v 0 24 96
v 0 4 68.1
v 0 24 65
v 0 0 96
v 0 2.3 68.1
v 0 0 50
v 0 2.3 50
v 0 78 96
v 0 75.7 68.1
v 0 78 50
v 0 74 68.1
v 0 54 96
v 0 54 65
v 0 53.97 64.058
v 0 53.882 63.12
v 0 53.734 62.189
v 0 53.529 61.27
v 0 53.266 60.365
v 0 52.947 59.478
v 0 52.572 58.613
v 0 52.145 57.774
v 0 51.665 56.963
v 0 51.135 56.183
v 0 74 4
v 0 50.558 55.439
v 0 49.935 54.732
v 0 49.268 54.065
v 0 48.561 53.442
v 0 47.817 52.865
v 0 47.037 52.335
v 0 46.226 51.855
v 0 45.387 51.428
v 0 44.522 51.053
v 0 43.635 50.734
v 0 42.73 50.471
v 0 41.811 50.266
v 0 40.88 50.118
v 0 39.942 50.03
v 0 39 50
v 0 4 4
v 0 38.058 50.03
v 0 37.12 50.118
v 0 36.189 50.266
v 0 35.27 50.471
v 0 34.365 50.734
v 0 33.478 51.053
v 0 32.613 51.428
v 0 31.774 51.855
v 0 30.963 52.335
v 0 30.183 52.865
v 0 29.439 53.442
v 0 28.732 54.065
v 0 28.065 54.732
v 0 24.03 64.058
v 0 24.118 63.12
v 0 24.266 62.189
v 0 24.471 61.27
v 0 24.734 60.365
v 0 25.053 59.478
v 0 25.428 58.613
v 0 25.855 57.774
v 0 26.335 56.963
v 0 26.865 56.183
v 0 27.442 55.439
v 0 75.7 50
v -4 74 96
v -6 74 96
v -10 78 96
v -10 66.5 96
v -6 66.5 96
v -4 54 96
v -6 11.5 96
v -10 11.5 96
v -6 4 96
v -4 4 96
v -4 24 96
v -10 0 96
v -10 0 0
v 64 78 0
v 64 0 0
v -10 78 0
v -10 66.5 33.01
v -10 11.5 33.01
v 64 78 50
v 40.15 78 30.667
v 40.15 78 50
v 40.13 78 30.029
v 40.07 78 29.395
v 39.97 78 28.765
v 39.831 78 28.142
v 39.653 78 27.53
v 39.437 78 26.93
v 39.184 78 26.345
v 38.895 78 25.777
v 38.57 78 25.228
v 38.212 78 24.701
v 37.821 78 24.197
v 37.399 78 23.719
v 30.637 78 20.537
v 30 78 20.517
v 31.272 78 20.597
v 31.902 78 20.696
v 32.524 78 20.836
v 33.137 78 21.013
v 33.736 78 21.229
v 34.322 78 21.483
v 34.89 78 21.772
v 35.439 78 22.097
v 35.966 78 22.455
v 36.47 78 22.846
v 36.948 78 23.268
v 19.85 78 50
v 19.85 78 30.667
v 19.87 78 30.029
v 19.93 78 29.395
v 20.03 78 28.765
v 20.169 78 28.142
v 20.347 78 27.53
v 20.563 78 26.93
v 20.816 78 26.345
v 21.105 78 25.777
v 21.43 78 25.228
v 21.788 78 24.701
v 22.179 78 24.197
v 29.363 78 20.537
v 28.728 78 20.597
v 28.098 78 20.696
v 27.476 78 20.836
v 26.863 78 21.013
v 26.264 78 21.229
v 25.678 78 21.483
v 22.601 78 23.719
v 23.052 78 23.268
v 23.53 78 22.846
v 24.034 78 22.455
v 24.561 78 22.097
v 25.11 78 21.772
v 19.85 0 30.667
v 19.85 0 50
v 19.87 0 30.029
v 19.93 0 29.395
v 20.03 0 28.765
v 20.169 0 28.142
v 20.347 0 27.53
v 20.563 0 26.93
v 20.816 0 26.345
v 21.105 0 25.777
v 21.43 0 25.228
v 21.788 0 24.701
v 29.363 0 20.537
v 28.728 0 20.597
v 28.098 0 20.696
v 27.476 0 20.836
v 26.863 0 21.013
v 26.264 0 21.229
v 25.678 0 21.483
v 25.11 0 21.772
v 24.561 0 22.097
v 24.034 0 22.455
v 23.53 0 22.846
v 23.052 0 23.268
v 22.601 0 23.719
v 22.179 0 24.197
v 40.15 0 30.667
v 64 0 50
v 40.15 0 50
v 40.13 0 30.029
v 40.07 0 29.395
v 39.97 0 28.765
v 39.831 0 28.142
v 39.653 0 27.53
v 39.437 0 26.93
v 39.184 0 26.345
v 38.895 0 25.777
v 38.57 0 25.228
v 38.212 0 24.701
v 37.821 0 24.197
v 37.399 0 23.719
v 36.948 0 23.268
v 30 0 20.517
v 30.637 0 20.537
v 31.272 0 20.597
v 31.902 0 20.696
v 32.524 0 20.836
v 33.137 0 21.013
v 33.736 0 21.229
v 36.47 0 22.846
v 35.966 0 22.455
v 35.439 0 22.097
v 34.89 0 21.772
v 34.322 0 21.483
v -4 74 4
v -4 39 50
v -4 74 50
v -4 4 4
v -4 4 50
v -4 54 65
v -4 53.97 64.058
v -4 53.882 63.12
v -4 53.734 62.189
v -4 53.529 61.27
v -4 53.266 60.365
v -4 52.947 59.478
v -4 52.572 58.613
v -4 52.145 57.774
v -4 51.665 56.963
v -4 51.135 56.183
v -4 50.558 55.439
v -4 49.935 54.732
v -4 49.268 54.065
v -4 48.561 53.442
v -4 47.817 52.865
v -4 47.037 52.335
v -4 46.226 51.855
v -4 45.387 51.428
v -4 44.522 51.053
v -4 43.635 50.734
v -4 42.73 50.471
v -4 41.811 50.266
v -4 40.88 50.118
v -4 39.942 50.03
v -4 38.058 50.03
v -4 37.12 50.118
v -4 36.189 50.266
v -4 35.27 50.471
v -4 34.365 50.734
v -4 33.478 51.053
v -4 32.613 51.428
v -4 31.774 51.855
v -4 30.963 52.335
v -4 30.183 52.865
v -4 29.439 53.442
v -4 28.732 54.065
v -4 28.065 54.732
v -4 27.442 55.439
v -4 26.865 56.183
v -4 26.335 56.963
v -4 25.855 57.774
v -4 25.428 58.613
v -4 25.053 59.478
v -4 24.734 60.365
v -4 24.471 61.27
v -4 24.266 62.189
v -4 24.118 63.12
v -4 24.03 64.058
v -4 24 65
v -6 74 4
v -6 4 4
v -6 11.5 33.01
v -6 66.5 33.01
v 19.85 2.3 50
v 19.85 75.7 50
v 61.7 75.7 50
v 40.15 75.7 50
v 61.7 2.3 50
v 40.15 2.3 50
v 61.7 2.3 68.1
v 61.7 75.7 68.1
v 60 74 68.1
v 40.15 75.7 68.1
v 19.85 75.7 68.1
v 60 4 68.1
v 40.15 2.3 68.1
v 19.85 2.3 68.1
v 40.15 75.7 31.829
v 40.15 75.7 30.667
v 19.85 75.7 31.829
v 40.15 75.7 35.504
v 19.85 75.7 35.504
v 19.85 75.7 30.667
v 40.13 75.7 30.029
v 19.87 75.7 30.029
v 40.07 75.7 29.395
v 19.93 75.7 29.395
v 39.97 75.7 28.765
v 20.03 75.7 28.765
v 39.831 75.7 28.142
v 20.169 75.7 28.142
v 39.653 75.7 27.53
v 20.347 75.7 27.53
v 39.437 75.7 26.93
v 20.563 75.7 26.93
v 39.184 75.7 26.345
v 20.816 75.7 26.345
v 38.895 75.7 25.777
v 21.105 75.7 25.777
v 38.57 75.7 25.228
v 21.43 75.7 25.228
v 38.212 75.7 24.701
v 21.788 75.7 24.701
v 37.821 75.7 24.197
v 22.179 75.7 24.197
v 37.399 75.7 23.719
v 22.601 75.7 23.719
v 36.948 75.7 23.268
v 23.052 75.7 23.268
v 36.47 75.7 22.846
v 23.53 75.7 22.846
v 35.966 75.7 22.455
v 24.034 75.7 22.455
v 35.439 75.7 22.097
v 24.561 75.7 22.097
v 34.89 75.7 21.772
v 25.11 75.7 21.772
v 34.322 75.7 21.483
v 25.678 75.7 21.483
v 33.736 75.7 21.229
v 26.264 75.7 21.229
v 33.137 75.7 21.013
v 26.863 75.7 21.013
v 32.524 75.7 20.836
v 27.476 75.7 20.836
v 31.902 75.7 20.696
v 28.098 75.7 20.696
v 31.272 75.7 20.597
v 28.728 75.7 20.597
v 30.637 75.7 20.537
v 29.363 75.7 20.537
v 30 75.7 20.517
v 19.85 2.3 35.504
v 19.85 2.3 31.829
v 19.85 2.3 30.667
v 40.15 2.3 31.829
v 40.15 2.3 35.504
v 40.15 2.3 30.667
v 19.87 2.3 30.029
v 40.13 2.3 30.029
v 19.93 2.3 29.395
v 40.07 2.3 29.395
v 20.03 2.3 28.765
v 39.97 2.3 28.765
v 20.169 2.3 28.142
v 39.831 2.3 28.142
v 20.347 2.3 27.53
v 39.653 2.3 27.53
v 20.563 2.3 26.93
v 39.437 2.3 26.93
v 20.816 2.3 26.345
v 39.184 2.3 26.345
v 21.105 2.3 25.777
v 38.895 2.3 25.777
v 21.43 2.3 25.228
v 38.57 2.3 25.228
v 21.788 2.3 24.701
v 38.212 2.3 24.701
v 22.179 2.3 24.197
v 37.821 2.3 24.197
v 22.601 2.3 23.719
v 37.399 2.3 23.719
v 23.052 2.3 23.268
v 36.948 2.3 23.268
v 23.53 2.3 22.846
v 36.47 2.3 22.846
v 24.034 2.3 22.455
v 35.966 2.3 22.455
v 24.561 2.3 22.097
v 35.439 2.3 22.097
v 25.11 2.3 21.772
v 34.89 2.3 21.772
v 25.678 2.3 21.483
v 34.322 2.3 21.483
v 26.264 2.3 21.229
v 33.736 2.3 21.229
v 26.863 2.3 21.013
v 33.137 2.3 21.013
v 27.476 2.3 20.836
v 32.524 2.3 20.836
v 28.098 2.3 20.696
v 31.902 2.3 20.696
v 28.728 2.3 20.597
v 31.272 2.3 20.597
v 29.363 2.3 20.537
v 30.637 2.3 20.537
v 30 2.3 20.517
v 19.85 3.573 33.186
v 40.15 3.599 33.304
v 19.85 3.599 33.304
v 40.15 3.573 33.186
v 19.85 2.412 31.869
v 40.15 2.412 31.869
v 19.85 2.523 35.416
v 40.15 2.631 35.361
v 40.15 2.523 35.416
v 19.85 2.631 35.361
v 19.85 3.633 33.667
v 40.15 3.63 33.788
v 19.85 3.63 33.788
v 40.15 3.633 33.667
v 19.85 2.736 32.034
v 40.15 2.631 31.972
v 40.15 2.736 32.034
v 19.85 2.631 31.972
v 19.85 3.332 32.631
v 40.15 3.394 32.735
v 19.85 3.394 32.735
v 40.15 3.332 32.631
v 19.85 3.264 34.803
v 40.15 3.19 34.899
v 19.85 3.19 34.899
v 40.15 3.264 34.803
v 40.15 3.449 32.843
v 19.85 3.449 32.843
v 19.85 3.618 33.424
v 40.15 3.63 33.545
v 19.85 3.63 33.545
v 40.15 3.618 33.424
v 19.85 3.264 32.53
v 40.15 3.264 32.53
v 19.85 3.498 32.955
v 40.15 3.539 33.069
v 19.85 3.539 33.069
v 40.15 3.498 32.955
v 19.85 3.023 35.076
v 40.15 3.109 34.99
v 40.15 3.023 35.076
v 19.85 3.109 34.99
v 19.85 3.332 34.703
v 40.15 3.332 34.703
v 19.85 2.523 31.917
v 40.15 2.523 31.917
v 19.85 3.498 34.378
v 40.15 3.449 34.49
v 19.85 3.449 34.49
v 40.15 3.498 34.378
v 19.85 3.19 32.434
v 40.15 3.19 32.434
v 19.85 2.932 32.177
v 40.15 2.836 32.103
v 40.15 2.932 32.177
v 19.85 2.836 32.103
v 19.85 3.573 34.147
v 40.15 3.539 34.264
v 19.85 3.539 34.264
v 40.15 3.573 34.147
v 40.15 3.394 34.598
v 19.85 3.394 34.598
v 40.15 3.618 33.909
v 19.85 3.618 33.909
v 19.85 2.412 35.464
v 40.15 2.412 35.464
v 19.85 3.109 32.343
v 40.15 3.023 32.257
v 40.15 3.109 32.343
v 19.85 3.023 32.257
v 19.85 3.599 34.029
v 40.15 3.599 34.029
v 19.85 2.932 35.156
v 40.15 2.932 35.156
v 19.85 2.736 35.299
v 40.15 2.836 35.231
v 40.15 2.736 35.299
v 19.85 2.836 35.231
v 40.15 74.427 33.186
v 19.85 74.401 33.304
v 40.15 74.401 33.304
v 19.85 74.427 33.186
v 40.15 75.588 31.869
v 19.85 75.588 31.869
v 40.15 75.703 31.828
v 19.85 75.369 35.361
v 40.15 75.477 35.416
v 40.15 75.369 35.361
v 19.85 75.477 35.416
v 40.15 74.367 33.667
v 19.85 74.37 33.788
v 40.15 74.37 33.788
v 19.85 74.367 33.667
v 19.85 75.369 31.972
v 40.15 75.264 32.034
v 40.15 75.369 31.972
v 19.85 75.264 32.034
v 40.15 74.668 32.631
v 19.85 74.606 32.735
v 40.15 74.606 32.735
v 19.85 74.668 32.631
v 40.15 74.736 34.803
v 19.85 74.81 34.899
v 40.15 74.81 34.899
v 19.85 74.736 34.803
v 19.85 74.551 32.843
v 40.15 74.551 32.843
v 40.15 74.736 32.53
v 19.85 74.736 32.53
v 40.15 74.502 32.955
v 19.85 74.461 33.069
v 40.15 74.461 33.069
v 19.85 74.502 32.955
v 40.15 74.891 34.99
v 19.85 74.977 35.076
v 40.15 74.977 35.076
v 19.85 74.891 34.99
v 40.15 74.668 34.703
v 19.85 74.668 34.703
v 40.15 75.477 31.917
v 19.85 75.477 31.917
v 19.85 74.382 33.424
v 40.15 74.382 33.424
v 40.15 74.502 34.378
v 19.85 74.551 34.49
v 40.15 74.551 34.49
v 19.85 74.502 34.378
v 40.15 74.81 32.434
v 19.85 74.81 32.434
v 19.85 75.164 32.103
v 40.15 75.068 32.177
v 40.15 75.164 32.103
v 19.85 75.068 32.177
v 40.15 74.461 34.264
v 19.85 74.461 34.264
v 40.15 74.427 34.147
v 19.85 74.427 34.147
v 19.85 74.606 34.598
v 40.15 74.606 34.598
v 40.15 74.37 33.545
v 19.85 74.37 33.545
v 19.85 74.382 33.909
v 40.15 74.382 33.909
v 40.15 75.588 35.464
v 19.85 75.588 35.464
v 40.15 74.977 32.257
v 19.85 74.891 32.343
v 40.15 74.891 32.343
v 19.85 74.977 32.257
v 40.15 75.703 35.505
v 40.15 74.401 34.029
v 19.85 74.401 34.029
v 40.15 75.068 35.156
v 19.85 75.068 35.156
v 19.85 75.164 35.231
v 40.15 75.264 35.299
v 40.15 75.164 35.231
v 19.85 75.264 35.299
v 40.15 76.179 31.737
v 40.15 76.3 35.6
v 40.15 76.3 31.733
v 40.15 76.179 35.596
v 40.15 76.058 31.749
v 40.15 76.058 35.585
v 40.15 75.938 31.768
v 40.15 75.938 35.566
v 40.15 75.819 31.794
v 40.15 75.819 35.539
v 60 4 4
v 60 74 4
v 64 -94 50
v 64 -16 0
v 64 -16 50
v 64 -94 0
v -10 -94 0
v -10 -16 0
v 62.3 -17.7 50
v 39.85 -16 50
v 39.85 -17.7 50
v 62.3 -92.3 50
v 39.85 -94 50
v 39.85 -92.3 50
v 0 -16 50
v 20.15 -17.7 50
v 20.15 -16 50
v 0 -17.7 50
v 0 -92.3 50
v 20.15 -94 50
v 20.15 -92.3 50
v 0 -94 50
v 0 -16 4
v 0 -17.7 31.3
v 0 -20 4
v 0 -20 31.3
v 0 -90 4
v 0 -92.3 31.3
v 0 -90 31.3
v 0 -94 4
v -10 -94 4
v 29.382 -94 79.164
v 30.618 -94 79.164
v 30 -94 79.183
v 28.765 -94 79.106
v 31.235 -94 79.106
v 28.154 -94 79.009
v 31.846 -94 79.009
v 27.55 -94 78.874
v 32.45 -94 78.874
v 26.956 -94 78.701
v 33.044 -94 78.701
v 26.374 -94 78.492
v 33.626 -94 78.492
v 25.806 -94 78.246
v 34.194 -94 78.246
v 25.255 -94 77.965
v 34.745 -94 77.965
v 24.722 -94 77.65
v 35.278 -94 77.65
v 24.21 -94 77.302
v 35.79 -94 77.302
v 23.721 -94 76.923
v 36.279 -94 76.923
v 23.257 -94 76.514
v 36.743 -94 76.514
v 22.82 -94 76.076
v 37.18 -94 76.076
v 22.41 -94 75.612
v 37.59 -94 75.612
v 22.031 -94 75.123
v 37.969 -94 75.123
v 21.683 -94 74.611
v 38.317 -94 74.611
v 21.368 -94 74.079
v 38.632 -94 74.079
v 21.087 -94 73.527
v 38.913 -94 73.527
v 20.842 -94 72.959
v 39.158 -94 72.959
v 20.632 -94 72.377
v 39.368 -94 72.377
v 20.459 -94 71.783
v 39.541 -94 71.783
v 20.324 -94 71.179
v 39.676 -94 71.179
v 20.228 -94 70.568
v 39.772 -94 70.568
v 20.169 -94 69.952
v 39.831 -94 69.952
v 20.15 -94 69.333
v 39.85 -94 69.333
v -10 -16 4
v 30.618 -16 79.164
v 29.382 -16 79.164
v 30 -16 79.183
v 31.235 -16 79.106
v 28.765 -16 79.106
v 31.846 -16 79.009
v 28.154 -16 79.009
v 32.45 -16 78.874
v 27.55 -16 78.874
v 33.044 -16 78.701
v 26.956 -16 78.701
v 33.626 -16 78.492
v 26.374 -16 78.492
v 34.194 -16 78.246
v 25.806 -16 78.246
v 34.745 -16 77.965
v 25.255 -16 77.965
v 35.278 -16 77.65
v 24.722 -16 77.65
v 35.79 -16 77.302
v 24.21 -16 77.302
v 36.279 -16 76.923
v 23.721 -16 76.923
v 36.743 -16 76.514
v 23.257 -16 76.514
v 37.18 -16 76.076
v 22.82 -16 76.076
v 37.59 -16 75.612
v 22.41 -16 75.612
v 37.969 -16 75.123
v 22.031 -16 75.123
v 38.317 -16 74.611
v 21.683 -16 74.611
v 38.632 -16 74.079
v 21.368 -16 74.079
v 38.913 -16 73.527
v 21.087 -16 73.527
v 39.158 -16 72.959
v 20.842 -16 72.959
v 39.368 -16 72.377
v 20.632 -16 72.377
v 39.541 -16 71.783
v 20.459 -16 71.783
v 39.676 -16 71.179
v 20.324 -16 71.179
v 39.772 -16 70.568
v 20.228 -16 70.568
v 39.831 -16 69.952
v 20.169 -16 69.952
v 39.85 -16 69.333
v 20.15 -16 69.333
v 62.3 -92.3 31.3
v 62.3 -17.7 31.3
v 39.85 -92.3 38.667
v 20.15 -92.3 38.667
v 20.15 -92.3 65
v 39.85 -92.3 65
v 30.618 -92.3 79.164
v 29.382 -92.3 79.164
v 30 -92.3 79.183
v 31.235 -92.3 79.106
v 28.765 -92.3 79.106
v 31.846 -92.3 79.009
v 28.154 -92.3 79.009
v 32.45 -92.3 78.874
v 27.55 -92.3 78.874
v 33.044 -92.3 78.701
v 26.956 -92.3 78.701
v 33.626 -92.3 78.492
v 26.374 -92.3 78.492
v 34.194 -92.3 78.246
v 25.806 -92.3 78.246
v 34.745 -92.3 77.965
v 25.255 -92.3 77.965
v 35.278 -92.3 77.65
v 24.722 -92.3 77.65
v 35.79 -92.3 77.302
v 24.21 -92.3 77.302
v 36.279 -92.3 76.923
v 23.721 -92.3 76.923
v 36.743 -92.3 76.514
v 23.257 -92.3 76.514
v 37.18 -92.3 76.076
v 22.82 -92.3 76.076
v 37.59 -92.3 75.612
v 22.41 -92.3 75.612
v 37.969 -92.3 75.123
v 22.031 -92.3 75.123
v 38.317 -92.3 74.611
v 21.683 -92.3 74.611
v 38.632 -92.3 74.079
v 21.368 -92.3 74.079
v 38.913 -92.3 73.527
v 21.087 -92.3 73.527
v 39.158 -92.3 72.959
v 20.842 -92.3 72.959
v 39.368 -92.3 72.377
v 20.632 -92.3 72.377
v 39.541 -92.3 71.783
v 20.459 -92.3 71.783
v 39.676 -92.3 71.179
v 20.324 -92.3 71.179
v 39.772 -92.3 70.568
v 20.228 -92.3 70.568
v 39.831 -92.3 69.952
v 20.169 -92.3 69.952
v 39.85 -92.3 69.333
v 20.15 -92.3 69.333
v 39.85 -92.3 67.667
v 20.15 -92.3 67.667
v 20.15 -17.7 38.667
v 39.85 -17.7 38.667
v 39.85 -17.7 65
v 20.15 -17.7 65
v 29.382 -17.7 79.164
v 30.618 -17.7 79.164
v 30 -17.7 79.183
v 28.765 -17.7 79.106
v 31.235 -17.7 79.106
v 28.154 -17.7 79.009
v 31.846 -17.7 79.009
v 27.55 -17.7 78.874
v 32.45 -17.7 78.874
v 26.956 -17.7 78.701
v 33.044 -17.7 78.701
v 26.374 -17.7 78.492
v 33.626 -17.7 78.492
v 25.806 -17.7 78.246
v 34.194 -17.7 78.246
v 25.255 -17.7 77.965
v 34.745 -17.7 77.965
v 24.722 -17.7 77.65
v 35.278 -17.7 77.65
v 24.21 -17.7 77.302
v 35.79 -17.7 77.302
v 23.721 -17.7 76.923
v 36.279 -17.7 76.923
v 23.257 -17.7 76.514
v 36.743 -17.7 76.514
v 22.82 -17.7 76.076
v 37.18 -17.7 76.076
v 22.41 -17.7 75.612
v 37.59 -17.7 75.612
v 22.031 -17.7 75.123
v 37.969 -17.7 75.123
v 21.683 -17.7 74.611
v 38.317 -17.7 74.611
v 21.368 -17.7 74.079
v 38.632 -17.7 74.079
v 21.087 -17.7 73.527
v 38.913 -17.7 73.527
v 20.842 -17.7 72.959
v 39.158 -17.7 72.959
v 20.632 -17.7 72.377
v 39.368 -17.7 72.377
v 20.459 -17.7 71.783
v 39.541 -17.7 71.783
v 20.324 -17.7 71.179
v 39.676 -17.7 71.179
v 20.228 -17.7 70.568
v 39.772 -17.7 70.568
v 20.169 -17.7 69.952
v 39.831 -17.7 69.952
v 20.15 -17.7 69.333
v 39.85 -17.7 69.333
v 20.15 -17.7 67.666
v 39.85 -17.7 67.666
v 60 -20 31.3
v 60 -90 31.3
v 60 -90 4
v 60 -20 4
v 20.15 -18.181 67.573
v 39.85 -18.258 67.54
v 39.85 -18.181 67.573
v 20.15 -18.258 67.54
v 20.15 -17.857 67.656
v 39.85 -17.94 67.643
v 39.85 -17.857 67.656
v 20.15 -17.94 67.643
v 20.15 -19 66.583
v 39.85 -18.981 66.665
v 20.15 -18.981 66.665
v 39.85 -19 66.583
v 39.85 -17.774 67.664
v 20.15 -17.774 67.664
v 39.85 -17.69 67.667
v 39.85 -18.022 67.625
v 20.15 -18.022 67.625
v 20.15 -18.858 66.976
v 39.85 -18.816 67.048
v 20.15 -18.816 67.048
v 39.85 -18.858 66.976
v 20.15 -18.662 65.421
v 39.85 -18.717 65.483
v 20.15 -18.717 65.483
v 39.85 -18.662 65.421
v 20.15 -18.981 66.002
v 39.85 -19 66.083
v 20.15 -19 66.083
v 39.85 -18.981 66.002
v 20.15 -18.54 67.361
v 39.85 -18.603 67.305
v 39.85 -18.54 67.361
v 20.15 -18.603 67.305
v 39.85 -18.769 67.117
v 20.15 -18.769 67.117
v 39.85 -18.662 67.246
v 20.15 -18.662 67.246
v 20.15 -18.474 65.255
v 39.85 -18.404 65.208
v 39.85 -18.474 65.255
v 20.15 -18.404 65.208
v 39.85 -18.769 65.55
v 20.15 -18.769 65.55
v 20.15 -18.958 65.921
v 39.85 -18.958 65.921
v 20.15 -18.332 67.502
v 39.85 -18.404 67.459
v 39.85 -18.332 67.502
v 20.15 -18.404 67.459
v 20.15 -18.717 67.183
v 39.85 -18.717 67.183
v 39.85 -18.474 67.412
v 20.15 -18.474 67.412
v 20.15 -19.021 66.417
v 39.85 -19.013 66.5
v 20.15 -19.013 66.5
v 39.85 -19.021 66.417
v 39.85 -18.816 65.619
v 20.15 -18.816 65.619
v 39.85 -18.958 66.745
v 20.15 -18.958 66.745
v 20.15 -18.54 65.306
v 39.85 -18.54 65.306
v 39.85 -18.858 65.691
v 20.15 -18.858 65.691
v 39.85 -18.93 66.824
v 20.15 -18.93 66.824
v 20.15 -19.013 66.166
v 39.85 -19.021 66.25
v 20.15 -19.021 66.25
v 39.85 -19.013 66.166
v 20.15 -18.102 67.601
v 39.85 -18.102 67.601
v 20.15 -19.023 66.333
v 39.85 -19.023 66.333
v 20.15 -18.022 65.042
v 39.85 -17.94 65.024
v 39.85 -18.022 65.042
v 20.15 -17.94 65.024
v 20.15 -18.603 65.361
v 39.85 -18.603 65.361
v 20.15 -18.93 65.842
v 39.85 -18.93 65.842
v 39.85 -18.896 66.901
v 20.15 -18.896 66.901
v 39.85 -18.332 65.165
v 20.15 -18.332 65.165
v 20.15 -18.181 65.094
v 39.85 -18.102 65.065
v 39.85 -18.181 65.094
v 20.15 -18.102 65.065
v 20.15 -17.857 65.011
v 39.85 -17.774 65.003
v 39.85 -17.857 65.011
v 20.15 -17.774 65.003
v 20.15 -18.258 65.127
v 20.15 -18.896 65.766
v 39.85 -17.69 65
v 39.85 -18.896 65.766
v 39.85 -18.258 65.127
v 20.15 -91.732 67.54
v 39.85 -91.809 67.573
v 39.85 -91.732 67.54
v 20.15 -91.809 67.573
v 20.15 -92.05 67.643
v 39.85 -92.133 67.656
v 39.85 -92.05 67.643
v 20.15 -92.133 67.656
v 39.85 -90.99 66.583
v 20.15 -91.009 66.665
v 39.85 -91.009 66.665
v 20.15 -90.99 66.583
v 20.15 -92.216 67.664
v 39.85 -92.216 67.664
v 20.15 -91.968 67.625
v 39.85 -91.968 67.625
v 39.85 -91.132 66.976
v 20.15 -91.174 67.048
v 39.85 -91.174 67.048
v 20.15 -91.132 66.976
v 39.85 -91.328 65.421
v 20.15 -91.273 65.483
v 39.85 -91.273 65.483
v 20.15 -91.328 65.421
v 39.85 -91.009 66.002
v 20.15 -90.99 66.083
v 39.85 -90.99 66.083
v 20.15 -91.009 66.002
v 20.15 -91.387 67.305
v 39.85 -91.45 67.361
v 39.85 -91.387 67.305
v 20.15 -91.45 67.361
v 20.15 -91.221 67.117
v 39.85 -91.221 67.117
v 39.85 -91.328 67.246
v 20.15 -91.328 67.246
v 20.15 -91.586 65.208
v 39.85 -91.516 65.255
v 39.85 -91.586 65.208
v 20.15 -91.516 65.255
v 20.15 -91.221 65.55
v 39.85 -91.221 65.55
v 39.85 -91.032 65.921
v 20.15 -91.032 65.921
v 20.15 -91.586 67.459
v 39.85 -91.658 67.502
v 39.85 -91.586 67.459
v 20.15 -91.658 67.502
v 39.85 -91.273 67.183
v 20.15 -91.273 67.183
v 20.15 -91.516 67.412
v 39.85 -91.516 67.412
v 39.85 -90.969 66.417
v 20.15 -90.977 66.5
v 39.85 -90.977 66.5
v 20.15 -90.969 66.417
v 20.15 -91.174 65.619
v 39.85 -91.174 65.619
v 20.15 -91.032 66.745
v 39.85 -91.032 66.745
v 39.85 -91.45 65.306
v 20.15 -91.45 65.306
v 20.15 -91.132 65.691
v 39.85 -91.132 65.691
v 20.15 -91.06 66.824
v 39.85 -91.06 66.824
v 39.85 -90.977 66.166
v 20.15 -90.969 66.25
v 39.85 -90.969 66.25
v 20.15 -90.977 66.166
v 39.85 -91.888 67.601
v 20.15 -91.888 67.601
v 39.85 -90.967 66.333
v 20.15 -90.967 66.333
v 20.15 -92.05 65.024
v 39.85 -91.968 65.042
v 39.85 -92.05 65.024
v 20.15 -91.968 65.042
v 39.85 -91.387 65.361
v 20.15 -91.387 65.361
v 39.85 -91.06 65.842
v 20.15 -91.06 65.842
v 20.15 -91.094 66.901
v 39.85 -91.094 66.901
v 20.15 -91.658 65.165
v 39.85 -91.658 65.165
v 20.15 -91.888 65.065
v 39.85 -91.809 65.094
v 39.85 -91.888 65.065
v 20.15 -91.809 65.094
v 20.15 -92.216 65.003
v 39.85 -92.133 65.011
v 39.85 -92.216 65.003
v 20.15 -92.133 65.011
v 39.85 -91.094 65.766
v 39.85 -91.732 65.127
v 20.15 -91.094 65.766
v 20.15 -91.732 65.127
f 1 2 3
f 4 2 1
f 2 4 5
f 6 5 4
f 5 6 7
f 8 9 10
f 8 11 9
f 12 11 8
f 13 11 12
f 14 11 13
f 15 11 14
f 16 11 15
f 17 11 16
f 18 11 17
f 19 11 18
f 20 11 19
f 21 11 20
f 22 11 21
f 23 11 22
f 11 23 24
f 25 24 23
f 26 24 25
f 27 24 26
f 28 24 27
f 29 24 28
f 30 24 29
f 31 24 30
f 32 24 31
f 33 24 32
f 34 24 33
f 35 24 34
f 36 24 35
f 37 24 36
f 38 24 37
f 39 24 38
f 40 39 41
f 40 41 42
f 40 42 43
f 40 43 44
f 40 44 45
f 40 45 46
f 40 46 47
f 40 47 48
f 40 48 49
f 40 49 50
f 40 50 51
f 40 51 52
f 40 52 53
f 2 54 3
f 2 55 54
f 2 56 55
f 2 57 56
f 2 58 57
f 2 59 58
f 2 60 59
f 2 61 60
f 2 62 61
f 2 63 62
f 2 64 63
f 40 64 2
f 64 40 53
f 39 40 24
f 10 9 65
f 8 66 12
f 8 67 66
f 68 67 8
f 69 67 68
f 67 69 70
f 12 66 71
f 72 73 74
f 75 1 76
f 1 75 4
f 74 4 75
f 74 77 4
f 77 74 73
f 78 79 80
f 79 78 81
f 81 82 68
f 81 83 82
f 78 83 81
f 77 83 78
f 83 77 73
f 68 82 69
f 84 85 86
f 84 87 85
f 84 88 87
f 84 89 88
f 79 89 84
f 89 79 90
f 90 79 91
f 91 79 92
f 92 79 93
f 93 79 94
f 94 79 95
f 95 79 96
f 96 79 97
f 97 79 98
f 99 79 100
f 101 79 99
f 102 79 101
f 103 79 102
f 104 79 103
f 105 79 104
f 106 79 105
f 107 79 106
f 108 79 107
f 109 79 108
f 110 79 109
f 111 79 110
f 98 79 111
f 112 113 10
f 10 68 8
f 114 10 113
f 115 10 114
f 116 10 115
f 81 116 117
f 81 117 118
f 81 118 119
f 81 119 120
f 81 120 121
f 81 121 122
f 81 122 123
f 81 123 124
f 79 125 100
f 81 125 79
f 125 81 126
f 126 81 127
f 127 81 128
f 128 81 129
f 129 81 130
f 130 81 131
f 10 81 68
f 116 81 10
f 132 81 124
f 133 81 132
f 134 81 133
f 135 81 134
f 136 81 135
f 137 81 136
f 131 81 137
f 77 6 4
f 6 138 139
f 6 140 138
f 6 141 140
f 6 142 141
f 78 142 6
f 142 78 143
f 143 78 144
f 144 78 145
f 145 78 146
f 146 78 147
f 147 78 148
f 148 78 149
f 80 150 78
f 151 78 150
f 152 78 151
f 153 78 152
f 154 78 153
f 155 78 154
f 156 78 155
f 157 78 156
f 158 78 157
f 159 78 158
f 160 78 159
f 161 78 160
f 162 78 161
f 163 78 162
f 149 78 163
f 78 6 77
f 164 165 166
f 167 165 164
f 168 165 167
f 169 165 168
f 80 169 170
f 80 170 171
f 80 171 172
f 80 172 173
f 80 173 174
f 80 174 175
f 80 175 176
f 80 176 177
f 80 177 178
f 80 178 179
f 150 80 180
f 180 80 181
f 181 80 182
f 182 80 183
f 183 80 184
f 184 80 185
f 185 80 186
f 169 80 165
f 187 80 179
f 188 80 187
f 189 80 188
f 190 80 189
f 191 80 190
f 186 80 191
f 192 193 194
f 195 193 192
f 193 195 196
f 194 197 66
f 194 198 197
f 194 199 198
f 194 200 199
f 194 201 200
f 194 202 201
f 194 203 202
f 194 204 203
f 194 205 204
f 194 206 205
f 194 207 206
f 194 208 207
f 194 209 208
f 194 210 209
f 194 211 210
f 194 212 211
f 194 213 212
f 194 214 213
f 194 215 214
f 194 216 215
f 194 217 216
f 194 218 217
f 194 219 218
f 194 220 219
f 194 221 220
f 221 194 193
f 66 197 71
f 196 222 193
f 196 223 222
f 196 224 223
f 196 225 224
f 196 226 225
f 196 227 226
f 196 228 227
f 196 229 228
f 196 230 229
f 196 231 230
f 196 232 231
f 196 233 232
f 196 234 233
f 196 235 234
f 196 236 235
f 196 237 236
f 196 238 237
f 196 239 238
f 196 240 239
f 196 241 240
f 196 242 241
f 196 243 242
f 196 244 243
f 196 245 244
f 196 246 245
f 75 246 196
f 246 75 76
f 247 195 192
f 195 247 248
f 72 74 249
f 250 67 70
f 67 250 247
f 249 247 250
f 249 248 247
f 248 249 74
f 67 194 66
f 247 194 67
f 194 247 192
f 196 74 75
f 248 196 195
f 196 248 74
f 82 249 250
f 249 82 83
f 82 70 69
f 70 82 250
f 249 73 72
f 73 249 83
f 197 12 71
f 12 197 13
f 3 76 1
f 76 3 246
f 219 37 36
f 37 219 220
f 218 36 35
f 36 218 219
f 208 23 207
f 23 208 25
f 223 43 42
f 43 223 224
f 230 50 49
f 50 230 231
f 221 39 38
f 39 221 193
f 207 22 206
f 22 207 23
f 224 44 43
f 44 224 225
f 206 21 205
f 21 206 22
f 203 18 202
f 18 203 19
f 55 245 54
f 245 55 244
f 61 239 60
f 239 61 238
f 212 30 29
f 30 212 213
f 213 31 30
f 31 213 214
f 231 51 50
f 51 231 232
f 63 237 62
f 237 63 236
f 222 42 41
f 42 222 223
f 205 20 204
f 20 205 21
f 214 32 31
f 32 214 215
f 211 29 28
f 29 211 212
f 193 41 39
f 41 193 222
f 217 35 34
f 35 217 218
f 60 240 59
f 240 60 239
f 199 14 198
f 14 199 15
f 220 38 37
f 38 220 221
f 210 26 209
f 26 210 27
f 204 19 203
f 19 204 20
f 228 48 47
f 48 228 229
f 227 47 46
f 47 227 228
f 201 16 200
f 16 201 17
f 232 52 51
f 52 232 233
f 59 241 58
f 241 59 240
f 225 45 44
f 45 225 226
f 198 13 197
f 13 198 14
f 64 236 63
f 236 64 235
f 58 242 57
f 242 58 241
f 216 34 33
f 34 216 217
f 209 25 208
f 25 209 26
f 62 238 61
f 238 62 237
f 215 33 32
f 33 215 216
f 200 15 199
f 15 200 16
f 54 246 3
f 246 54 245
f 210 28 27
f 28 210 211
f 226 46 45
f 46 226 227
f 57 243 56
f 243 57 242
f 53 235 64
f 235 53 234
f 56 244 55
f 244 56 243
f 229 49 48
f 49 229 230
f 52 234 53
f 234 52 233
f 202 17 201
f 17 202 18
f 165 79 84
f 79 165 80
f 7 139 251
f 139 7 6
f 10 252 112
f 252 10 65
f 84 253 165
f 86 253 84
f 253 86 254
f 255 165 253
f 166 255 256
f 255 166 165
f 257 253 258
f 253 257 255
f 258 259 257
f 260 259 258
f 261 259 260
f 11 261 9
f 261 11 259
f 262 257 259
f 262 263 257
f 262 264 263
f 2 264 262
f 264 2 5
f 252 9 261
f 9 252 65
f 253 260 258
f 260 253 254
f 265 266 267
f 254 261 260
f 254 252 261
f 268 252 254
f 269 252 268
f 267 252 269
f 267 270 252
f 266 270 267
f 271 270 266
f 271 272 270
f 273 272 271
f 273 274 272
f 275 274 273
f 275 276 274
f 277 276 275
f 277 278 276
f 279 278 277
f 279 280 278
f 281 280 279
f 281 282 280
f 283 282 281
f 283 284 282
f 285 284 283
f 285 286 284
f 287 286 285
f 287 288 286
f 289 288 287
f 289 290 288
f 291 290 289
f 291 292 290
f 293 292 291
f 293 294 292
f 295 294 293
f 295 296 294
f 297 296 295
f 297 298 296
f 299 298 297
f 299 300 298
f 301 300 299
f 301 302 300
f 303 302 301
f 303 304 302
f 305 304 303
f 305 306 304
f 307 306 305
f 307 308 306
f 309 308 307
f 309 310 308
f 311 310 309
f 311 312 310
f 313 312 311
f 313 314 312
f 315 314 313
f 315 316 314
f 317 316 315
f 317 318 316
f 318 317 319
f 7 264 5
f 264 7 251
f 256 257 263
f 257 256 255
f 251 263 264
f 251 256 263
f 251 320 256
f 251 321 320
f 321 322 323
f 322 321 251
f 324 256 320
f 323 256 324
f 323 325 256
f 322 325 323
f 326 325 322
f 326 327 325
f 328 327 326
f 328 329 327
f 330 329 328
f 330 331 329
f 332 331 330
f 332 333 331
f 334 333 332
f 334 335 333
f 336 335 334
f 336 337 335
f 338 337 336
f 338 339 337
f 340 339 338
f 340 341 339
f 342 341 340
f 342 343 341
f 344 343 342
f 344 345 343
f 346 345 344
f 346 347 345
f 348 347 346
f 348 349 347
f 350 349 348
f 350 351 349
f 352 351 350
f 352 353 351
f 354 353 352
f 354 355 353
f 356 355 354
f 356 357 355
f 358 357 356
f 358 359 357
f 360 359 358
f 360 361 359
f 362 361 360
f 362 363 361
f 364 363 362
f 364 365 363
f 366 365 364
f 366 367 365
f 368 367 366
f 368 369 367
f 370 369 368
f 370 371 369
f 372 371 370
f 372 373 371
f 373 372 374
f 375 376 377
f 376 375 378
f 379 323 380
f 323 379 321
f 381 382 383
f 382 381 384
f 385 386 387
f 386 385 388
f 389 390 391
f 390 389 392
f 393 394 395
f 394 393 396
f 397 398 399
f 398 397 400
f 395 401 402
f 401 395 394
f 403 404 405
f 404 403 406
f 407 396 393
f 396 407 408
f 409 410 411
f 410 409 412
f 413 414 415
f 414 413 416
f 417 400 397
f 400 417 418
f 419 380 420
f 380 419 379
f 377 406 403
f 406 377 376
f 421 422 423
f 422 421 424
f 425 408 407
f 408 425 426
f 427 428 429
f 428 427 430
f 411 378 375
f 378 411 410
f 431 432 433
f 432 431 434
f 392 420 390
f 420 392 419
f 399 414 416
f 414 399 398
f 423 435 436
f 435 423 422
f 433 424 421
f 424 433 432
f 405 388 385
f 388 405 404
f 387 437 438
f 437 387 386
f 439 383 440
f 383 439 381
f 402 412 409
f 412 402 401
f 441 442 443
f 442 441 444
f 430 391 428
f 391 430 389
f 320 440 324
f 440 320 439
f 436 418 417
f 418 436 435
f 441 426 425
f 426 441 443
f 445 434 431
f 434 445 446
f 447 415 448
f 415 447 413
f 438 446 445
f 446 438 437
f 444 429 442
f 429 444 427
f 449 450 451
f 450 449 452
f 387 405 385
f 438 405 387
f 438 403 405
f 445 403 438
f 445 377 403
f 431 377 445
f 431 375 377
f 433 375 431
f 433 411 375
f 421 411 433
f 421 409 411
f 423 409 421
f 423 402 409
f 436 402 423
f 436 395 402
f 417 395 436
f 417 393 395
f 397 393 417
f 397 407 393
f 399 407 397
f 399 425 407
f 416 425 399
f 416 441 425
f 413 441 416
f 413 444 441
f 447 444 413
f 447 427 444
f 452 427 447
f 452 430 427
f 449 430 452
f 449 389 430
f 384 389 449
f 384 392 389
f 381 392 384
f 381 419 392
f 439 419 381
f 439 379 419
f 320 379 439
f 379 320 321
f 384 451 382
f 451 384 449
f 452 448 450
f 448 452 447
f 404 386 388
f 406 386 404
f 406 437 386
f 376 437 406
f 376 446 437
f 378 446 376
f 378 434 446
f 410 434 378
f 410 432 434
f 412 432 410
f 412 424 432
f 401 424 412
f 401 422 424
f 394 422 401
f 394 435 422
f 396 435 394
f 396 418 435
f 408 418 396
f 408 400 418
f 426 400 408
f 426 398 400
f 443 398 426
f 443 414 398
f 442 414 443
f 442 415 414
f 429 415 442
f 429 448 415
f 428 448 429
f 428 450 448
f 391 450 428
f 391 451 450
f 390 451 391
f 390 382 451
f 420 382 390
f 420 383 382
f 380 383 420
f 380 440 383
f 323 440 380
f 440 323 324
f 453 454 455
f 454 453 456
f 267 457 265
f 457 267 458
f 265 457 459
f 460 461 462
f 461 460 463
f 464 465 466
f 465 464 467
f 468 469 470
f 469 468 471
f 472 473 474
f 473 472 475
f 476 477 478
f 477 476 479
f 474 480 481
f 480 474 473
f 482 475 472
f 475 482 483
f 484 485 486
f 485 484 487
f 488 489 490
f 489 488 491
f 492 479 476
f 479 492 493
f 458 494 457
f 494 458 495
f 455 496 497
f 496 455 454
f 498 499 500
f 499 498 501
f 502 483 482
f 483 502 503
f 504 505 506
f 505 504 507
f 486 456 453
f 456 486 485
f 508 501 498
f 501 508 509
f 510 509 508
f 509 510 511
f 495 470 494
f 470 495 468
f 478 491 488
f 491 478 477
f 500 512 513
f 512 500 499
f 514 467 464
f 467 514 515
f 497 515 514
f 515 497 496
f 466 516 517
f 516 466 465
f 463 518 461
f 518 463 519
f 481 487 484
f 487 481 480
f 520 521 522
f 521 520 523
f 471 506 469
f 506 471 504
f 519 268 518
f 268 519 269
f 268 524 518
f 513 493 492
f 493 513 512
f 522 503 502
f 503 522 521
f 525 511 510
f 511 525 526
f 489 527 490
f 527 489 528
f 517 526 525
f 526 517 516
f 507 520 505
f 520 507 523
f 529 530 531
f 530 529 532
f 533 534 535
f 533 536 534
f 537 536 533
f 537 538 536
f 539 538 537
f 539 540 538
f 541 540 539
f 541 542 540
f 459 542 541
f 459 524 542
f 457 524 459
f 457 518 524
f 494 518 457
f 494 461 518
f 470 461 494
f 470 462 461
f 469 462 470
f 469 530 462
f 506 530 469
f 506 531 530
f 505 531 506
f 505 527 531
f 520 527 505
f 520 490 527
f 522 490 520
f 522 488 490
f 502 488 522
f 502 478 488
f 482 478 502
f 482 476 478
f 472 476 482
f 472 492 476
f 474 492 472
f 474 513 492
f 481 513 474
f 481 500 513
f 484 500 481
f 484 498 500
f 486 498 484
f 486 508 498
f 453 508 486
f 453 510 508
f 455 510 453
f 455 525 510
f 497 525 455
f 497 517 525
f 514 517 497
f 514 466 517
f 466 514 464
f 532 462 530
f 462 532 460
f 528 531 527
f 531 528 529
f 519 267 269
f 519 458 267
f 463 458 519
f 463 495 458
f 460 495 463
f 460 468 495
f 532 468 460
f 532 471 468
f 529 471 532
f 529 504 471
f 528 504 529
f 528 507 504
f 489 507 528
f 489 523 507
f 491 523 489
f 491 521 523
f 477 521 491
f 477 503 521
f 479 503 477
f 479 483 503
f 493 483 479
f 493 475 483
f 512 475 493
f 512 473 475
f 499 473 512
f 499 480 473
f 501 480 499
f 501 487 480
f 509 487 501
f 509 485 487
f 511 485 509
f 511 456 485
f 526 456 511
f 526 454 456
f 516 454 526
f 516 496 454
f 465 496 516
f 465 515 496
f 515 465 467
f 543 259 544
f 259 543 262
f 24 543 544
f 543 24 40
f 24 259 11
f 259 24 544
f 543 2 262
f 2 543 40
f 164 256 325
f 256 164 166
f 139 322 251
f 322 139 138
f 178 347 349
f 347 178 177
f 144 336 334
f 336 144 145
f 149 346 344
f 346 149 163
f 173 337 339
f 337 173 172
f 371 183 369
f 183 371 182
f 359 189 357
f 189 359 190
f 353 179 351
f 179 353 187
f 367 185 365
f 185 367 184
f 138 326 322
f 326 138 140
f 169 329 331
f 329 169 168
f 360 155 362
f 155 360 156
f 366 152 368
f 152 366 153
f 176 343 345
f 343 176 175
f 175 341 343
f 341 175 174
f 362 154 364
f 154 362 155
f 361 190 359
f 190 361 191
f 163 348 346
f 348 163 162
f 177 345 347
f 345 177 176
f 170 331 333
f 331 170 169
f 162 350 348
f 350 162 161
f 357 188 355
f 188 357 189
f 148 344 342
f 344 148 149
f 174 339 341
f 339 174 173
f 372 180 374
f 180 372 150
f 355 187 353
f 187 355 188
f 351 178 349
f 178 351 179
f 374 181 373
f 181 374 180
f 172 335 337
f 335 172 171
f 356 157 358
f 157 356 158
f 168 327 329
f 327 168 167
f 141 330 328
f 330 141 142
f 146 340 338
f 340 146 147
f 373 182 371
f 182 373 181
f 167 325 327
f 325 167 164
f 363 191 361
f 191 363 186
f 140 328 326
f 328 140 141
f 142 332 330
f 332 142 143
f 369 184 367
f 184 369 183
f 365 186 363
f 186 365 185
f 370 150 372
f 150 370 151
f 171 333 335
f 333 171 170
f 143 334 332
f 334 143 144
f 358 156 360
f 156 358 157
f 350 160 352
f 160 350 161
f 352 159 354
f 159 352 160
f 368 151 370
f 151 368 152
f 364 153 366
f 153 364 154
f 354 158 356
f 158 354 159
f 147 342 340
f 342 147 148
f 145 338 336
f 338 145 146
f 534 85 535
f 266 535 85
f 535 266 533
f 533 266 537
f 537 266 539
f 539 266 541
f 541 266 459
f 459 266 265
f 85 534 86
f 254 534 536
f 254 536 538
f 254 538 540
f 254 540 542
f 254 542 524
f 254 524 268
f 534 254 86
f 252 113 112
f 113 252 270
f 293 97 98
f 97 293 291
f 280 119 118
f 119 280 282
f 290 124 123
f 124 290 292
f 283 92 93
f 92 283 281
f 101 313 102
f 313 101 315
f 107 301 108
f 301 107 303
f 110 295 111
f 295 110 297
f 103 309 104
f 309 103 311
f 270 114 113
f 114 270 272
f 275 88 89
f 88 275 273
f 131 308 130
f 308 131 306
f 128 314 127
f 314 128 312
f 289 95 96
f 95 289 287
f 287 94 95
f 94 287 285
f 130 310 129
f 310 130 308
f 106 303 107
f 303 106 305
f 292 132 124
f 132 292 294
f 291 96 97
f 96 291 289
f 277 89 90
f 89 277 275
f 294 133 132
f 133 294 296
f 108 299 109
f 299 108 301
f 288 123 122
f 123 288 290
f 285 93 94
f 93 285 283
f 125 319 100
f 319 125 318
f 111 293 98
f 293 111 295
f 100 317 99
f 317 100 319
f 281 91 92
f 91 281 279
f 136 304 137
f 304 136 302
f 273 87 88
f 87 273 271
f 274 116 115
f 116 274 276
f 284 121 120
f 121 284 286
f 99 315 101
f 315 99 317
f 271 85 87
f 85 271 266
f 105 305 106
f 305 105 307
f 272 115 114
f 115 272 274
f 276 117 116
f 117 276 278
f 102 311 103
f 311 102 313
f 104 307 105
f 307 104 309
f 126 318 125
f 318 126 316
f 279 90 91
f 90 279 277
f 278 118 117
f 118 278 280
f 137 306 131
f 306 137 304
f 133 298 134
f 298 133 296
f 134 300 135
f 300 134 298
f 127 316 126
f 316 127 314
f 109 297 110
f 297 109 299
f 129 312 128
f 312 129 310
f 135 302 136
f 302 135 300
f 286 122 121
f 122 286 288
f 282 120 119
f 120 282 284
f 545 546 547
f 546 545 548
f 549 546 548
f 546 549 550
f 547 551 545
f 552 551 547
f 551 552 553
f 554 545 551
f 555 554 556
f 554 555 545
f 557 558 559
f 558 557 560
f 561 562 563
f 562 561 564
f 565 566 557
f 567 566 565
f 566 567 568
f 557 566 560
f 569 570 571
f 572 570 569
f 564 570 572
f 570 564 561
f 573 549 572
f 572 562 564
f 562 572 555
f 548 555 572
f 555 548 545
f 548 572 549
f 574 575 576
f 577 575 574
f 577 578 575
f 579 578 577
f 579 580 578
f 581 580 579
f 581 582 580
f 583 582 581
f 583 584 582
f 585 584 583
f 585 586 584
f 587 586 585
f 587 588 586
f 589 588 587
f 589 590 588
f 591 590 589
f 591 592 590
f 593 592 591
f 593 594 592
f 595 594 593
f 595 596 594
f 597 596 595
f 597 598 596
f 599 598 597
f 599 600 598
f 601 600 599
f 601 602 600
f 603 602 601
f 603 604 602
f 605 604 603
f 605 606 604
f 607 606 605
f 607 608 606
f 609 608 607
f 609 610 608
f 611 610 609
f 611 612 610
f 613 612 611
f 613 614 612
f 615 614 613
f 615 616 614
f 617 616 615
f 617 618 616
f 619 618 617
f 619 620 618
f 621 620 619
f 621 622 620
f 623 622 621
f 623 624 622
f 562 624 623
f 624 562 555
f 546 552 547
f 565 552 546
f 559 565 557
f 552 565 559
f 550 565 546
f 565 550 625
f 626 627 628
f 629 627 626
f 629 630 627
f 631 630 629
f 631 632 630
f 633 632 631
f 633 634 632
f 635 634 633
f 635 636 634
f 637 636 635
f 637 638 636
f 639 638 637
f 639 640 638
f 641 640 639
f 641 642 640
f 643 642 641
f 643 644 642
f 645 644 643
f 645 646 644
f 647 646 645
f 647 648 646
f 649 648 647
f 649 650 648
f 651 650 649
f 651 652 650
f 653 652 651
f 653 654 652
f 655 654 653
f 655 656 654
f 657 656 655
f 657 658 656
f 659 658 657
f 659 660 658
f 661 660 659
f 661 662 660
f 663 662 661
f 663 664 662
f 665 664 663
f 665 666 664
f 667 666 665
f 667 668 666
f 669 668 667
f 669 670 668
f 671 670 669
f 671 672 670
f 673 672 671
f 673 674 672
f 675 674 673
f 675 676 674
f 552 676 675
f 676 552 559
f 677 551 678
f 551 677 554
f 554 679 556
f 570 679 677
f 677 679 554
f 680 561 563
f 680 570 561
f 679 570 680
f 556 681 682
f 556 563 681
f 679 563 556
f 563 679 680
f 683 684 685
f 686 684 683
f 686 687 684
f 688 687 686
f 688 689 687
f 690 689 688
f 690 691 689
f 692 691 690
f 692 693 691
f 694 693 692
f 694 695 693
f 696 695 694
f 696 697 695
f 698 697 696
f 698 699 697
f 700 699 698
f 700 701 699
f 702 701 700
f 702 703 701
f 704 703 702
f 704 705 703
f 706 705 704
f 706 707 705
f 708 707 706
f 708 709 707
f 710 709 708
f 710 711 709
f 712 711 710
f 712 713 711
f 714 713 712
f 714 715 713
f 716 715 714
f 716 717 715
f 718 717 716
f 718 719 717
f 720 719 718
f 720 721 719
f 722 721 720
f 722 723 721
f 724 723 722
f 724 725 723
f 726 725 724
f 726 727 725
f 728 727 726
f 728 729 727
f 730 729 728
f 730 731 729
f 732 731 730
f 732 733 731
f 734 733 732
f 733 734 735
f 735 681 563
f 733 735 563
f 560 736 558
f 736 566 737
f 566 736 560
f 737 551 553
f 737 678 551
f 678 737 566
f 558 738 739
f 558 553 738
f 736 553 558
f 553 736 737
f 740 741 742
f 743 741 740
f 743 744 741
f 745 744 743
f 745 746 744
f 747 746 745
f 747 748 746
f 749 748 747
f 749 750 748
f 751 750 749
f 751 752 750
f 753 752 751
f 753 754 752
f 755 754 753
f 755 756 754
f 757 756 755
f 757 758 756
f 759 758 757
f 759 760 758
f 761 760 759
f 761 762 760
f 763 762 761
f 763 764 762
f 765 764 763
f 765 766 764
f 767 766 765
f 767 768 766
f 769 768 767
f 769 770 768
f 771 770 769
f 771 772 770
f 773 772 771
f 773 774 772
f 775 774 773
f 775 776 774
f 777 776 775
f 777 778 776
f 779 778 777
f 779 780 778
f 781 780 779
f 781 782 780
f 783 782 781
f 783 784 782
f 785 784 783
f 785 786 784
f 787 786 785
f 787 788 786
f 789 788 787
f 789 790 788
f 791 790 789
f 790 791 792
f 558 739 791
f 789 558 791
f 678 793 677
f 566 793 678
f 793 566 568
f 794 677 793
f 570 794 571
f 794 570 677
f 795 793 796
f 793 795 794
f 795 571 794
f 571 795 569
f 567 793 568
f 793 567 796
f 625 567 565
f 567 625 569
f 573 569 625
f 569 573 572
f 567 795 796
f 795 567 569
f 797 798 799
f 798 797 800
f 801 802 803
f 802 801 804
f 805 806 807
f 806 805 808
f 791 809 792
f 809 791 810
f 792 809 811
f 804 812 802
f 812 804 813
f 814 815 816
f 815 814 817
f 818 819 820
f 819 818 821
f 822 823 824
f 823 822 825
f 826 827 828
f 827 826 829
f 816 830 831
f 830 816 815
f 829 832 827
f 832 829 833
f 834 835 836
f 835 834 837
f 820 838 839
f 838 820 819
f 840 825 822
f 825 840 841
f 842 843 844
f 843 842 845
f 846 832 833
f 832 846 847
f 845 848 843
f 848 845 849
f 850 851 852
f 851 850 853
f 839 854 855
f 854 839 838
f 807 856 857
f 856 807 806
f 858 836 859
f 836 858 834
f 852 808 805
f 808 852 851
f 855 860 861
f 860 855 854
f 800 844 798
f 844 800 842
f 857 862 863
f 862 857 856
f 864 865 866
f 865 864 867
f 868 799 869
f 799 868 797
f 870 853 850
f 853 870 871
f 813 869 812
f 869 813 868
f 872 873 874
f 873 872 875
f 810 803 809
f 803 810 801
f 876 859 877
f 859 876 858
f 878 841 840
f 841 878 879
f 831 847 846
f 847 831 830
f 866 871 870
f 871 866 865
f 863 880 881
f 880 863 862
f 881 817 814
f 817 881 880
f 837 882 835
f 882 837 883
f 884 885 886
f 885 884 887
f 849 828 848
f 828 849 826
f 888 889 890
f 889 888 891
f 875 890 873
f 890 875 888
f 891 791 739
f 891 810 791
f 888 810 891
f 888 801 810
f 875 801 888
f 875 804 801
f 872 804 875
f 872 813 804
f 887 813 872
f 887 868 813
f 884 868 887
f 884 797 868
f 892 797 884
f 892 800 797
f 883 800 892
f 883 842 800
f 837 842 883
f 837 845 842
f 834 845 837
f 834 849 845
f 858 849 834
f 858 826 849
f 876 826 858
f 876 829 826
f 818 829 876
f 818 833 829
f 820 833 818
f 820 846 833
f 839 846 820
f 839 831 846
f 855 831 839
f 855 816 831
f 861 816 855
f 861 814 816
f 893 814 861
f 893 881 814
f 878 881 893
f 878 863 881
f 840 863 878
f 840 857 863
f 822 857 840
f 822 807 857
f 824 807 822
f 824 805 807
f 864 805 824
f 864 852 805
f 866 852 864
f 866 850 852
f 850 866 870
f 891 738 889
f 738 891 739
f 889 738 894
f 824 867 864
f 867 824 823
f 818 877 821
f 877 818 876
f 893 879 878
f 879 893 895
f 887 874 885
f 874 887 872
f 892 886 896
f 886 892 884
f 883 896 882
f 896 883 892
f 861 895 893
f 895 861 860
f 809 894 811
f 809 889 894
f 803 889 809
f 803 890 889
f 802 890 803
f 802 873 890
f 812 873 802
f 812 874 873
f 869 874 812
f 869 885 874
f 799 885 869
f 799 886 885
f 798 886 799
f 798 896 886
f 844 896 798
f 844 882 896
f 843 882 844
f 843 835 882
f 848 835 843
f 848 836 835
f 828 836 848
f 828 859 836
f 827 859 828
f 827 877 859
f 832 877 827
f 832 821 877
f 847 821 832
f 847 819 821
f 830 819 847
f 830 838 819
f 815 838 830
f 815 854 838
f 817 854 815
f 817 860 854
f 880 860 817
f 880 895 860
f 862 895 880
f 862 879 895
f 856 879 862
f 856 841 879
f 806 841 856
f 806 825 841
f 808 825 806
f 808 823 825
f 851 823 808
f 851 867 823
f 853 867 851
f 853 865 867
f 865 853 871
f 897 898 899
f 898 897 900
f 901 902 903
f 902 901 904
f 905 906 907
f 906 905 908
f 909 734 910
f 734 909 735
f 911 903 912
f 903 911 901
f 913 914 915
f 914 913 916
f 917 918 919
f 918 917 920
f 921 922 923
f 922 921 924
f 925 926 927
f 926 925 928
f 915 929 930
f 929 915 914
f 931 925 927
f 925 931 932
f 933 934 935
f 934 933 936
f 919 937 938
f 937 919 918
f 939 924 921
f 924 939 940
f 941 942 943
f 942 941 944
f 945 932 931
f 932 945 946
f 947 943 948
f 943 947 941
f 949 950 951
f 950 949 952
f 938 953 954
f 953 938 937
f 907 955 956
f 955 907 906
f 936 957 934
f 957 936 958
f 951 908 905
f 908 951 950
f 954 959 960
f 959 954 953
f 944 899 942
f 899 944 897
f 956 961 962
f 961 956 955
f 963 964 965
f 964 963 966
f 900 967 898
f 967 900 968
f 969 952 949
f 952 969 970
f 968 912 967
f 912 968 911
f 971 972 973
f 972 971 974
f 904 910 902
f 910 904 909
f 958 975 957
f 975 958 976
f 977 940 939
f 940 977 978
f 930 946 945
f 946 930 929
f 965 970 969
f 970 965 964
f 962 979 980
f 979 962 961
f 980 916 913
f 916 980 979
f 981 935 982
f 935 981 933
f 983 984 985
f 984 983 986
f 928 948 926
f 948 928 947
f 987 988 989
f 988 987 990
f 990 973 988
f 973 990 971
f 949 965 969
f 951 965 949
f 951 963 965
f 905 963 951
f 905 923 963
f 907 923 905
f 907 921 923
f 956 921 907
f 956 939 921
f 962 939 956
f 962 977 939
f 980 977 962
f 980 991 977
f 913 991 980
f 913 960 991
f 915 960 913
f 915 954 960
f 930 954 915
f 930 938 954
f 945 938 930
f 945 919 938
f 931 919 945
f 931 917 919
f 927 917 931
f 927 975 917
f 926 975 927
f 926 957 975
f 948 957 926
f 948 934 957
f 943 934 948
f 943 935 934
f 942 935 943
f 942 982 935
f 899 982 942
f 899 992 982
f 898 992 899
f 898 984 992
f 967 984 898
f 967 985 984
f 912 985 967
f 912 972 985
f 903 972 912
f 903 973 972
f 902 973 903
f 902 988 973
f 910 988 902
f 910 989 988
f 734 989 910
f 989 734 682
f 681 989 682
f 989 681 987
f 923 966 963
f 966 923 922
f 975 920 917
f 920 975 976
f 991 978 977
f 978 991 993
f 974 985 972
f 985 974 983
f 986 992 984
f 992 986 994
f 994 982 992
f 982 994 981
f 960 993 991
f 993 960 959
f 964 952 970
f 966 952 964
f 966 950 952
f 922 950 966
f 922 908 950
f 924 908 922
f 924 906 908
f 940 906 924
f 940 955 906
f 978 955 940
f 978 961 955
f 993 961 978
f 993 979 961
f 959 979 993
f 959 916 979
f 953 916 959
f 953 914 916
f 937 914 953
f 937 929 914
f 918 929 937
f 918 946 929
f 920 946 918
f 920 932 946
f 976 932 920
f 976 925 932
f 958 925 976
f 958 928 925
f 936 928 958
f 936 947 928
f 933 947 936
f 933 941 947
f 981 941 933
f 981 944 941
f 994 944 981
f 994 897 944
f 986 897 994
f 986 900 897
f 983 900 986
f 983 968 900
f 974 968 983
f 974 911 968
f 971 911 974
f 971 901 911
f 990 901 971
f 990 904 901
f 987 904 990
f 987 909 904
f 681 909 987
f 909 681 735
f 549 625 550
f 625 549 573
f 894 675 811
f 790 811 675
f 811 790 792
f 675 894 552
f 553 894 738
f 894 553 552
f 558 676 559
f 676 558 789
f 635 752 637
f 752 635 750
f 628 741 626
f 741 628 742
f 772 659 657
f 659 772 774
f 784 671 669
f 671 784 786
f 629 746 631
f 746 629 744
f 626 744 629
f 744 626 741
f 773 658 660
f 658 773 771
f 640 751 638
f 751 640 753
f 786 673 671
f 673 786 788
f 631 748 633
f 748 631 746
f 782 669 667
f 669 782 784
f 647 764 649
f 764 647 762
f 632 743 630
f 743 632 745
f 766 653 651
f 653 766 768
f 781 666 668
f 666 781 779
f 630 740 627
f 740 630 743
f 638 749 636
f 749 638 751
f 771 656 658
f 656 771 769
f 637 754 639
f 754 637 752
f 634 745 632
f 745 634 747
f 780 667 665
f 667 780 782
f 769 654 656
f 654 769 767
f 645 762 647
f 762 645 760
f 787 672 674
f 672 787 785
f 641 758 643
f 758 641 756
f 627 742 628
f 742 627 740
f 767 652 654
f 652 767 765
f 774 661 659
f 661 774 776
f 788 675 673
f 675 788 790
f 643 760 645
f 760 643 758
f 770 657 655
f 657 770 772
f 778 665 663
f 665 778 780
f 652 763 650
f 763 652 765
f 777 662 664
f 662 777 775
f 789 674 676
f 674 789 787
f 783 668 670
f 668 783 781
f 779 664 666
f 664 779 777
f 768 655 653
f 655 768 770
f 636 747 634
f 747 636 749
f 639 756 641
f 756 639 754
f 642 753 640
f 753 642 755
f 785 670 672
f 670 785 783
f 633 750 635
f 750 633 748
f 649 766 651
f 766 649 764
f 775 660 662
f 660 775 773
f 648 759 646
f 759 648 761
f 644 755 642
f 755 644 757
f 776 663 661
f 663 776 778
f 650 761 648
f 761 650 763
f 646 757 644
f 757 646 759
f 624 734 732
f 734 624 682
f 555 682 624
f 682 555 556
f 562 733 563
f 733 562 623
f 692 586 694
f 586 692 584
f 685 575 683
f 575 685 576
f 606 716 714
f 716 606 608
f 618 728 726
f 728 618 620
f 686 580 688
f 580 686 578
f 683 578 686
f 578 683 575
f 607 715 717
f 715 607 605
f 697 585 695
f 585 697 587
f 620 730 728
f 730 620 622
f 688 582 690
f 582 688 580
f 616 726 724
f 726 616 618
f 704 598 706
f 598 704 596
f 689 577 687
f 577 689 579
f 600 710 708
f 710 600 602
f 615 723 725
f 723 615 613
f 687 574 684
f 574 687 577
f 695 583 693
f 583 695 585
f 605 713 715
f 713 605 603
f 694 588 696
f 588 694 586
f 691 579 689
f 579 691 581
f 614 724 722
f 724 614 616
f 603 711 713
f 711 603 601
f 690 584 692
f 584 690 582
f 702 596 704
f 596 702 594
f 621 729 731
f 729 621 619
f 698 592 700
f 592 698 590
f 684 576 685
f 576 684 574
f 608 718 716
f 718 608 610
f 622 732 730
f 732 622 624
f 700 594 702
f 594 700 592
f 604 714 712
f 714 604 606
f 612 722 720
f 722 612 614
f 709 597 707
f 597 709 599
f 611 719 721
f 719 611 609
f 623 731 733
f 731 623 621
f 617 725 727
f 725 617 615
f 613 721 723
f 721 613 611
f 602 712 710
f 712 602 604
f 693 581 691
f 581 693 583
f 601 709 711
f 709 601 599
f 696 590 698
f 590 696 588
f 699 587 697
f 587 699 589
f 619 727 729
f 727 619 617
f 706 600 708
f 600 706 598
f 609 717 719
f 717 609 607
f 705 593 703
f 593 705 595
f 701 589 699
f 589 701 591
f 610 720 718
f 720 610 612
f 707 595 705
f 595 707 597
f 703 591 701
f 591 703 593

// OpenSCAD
//parametrics:


//length of deck --> a deck of 100 unsleeved cards are ~32mm thick, 100 sleeved cards ~57mm thick
deckl = 60;	
//width of deck in mm --> ~66 for unsleeved cards, ~70 for sleeved 
deckw = 70;	
//height of deck --> ~89 unsleeved, ~92 sleeved
deckh = 92;	
//changes where lid meets box;should be a value between 0.3 and 0.8
lid_height = 0.5;   
deckh_lower = deckh*lid_height;	
deckh_upper = deckh*(1-deckh_lower/deckh);
//how thick the walls are in mm, probably stay above 3
wall = 4;			
//how much tolerance for the lid in mm
tolerance = 0.6;	
//commander stuff
commandl = 2;		
commandw = 70;
//this determines the entire height of deckbox, should be greater than or equal to "deckh"
commandh = 92;     
//window for commander artwork
windoww = 55;		
windowh = 63;
//changes size of grip, 0 for no grip space
gripw = 30;			
griph = deckh_lower+deckh*0.2+tolerance;
bump_radius = wall/3;



///This was made by David South (south2012)


module Commander ()
	{
     difference()
        {
            	cube([commandl+2*wall,commandw+2*wall,commandh+wall]);
            translate([wall,wall,wall])
            	cube([commandl,commandw,commandh+0.01]);
        		translate([-0.01,((commandw+2*wall)-windoww)/2,commandh-windowh+0.01+wall])
            	cube([wall+0.02,windoww,windowh]);
			
        }    
	}
    
module Deckbox ()
    {
    difference()
        {
			union()
			{
         	cube ([deckl+(wall*2),deckw+(wall*2),deckh_lower+wall]);
			translate([wall,0.5*wall+tolerance/2,deckh_lower+wall])
				cube([deckl+0.5*wall-tolerance/2,deckw+wall-tolerance,deckh*0.2-tolerance/2]);
			}
			translate([wall,wall,wall])
				cube ([deckl,deckw,deckh+0.01]);
			translate([deckl/3-tolerance/4+wall,0,deckh_lower-(deckh/6)])
				cube([deckl/3+0.5*tolerance,wall/2+0.5*tolerance,deckh_lower]);
			translate([deckl/2+wall,wall/2+0.5*tolerance,deckh_lower-(deckh/6)])
				rotate(90,[1,0,0])cylinder($fn=100,r=deckl/6+tolerance/4,h=0.5*wall+0.5*tolerance);
			translate([deckl/3-tolerance/4+wall,1.5*wall+deckw-tolerance/2,deckh_lower-(deckh/6)])
				cube([deckl/3+0.5*tolerance,wall/2+tolerance,deckh_lower]);
			translate([deckl/2+wall,2*wall+deckw,deckh_lower-(deckh/6)])
				rotate(90,[1,0,0])cylinder($fn=100,r=deckl/6+tolerance/4,h=0.5*wall+0.5*tolerance);
        
        translate([deckl/3+tolerance/4+wall-tolerance/2,wall/2-tolerance/2,deckh_lower-(deckh/6)+3])
            {
           intersection(){rotate(90,[0,1,0])cylinder($fn=100,r=bump_radius+tolerance,h=deckl/3+tolerance);
           translate([0,0,-bump_radius-tolerance])cube([deckl/3+tolerance/2,bump_radius+tolerance,2*bump_radius+2*tolerance]);}}
       
           rotate(180,[0,0,1])translate([-2/3*deckl-wall-tolerance/4,-1.5*wall-deckw-tolerance/2,deckh_lower-(deckh/6)+3])
            {
           intersection(){rotate(90,[0,1,0])cylinder($fn=100,r=bump_radius+tolerance,h=deckl/3+tolerance);
           translate([0,0,-bump_radius-tolerance])cube([deckl/3+tolerance/2,bump_radius+tolerance,2*bump_radius+2]);}}
   
       }
    }

module Lid ()
	{
	difference()
		{
		translate([0,0,deckh_lower])
			cube([deckl+wall,deckw+2*wall,deckh_upper+wall]);
		translate([0,0.5*wall-tolerance/2,deckh_lower])
			cube([deckl+0.5*wall+tolerance/2,deckw+wall+tolerance,deckh*deckh_upper]);
		}
        difference()
        {
        translate([0,0,deckh_lower+0.2*deckh+tolerance/2]) cube([deckl+wall,deckw+2*wall,-0.2*deckh+commandh]);
        translate([0,wall,deckh_lower+0.2*deckh+tolerance/2]) cube([deckl,deckw,0.5*deckh-0.2*deckh+wall+commandh-deckh]);
        translate([-0.01,-0.01,commandh]) cube([deckl+wall+0.02,deckw+2*wall+0.02,deckh]);
        }
	translate([0,0,deckh])
		cube([deckl+wall,deckw+2*wall,commandh-deckh+wall]);
	translate([-1*(wall*2+commandl),((0.5*(deckw+2*wall))-(0.5*(commandw+2*wall))),commandh])
		cube([commandl+2*wall,commandw+2*wall,wall]);
	translate([deckl/3+tolerance/4,0,deckh_lower-(deckh/6)-wall])
		cube([deckl/3-tolerance/2,wall/2-tolerance/2,deckh/3]);
	translate([deckl/2,wall/2-0.5*tolerance,deckh_lower-(deckh/6+wall)])
		rotate(90,[1,0,0])cylinder($fn=100,r=deckl/6-tolerance/4,h=0.5*wall-0.5*tolerance);
	translate([deckl/3+tolerance/4,deckw+1.5*wall+0.5*tolerance,deckh_lower-(deckh/6)-wall])
		cube([deckl/3-tolerance/2,wall/2-tolerance/2,deckh/3]);
	translate([deckl/2,deckw+1.5*wall+0.5*tolerance+wall/2-tolerance/2,deckh_lower-(deckh/6)-wall])
		rotate(90,[1,0,0])cylinder($fn=100,r=deckl/6-tolerance/4,h=0.5*wall-0.5*tolerance);
    translate([deckl/3+tolerance/4,wall/2-tolerance/2-0.01,deckh_lower-(deckh/6)+3-wall])
            {
           intersection(){rotate(90,[0,1,0])cylinder($fn=100,r=bump_radius,h=deckl/3);
           translate([0,0,-bump_radius])cube([deckl/3-tolerance/2,bump_radius,2*bump_radius]);}}
    translate([2*deckl/3-tolerance/4,2*wall+deckw-wall/2+tolerance/2,deckh_lower-(deckh/6)+3-wall])
            {
           rotate(180,[0,0,1]){intersection(){rotate(90,[0,1,0])cylinder($fn=100,r=bump_radius,h=deckl/3);
           translate([0,0,-bump_radius])cube([deckl/3-tolerance/2,bump_radius,2*bump_radius]);}}}
           
    
       }
	
	
//Commander stuff

	{
	difference()
	{	
	translate ([-1*(commandl+2*wall),((0.5*(deckw+2*wall))-(0.5*(commandw+2*wall))),0])
		Commander();
		translate([-wall,(2*wall+deckw)/2,griph+0.5*commandh])
				{
				cube([4*wall,gripw,commandh],center=true);
				}
		translate([-wall,(2*wall+deckw)/2,griph])
				{
				rotate(90,[0,1,0])cylinder($fn=100,r=gripw/2,h=4*wall+2,center=true);
				}

	}
	}	


//Actual deck

translate([-wall,0,0])
   Deckbox();

rotate(180,[0,0,1])rotate(180,[0,1,0])translate([0,wall*4,-commandh-wall])
		
    Lid();

    





 
